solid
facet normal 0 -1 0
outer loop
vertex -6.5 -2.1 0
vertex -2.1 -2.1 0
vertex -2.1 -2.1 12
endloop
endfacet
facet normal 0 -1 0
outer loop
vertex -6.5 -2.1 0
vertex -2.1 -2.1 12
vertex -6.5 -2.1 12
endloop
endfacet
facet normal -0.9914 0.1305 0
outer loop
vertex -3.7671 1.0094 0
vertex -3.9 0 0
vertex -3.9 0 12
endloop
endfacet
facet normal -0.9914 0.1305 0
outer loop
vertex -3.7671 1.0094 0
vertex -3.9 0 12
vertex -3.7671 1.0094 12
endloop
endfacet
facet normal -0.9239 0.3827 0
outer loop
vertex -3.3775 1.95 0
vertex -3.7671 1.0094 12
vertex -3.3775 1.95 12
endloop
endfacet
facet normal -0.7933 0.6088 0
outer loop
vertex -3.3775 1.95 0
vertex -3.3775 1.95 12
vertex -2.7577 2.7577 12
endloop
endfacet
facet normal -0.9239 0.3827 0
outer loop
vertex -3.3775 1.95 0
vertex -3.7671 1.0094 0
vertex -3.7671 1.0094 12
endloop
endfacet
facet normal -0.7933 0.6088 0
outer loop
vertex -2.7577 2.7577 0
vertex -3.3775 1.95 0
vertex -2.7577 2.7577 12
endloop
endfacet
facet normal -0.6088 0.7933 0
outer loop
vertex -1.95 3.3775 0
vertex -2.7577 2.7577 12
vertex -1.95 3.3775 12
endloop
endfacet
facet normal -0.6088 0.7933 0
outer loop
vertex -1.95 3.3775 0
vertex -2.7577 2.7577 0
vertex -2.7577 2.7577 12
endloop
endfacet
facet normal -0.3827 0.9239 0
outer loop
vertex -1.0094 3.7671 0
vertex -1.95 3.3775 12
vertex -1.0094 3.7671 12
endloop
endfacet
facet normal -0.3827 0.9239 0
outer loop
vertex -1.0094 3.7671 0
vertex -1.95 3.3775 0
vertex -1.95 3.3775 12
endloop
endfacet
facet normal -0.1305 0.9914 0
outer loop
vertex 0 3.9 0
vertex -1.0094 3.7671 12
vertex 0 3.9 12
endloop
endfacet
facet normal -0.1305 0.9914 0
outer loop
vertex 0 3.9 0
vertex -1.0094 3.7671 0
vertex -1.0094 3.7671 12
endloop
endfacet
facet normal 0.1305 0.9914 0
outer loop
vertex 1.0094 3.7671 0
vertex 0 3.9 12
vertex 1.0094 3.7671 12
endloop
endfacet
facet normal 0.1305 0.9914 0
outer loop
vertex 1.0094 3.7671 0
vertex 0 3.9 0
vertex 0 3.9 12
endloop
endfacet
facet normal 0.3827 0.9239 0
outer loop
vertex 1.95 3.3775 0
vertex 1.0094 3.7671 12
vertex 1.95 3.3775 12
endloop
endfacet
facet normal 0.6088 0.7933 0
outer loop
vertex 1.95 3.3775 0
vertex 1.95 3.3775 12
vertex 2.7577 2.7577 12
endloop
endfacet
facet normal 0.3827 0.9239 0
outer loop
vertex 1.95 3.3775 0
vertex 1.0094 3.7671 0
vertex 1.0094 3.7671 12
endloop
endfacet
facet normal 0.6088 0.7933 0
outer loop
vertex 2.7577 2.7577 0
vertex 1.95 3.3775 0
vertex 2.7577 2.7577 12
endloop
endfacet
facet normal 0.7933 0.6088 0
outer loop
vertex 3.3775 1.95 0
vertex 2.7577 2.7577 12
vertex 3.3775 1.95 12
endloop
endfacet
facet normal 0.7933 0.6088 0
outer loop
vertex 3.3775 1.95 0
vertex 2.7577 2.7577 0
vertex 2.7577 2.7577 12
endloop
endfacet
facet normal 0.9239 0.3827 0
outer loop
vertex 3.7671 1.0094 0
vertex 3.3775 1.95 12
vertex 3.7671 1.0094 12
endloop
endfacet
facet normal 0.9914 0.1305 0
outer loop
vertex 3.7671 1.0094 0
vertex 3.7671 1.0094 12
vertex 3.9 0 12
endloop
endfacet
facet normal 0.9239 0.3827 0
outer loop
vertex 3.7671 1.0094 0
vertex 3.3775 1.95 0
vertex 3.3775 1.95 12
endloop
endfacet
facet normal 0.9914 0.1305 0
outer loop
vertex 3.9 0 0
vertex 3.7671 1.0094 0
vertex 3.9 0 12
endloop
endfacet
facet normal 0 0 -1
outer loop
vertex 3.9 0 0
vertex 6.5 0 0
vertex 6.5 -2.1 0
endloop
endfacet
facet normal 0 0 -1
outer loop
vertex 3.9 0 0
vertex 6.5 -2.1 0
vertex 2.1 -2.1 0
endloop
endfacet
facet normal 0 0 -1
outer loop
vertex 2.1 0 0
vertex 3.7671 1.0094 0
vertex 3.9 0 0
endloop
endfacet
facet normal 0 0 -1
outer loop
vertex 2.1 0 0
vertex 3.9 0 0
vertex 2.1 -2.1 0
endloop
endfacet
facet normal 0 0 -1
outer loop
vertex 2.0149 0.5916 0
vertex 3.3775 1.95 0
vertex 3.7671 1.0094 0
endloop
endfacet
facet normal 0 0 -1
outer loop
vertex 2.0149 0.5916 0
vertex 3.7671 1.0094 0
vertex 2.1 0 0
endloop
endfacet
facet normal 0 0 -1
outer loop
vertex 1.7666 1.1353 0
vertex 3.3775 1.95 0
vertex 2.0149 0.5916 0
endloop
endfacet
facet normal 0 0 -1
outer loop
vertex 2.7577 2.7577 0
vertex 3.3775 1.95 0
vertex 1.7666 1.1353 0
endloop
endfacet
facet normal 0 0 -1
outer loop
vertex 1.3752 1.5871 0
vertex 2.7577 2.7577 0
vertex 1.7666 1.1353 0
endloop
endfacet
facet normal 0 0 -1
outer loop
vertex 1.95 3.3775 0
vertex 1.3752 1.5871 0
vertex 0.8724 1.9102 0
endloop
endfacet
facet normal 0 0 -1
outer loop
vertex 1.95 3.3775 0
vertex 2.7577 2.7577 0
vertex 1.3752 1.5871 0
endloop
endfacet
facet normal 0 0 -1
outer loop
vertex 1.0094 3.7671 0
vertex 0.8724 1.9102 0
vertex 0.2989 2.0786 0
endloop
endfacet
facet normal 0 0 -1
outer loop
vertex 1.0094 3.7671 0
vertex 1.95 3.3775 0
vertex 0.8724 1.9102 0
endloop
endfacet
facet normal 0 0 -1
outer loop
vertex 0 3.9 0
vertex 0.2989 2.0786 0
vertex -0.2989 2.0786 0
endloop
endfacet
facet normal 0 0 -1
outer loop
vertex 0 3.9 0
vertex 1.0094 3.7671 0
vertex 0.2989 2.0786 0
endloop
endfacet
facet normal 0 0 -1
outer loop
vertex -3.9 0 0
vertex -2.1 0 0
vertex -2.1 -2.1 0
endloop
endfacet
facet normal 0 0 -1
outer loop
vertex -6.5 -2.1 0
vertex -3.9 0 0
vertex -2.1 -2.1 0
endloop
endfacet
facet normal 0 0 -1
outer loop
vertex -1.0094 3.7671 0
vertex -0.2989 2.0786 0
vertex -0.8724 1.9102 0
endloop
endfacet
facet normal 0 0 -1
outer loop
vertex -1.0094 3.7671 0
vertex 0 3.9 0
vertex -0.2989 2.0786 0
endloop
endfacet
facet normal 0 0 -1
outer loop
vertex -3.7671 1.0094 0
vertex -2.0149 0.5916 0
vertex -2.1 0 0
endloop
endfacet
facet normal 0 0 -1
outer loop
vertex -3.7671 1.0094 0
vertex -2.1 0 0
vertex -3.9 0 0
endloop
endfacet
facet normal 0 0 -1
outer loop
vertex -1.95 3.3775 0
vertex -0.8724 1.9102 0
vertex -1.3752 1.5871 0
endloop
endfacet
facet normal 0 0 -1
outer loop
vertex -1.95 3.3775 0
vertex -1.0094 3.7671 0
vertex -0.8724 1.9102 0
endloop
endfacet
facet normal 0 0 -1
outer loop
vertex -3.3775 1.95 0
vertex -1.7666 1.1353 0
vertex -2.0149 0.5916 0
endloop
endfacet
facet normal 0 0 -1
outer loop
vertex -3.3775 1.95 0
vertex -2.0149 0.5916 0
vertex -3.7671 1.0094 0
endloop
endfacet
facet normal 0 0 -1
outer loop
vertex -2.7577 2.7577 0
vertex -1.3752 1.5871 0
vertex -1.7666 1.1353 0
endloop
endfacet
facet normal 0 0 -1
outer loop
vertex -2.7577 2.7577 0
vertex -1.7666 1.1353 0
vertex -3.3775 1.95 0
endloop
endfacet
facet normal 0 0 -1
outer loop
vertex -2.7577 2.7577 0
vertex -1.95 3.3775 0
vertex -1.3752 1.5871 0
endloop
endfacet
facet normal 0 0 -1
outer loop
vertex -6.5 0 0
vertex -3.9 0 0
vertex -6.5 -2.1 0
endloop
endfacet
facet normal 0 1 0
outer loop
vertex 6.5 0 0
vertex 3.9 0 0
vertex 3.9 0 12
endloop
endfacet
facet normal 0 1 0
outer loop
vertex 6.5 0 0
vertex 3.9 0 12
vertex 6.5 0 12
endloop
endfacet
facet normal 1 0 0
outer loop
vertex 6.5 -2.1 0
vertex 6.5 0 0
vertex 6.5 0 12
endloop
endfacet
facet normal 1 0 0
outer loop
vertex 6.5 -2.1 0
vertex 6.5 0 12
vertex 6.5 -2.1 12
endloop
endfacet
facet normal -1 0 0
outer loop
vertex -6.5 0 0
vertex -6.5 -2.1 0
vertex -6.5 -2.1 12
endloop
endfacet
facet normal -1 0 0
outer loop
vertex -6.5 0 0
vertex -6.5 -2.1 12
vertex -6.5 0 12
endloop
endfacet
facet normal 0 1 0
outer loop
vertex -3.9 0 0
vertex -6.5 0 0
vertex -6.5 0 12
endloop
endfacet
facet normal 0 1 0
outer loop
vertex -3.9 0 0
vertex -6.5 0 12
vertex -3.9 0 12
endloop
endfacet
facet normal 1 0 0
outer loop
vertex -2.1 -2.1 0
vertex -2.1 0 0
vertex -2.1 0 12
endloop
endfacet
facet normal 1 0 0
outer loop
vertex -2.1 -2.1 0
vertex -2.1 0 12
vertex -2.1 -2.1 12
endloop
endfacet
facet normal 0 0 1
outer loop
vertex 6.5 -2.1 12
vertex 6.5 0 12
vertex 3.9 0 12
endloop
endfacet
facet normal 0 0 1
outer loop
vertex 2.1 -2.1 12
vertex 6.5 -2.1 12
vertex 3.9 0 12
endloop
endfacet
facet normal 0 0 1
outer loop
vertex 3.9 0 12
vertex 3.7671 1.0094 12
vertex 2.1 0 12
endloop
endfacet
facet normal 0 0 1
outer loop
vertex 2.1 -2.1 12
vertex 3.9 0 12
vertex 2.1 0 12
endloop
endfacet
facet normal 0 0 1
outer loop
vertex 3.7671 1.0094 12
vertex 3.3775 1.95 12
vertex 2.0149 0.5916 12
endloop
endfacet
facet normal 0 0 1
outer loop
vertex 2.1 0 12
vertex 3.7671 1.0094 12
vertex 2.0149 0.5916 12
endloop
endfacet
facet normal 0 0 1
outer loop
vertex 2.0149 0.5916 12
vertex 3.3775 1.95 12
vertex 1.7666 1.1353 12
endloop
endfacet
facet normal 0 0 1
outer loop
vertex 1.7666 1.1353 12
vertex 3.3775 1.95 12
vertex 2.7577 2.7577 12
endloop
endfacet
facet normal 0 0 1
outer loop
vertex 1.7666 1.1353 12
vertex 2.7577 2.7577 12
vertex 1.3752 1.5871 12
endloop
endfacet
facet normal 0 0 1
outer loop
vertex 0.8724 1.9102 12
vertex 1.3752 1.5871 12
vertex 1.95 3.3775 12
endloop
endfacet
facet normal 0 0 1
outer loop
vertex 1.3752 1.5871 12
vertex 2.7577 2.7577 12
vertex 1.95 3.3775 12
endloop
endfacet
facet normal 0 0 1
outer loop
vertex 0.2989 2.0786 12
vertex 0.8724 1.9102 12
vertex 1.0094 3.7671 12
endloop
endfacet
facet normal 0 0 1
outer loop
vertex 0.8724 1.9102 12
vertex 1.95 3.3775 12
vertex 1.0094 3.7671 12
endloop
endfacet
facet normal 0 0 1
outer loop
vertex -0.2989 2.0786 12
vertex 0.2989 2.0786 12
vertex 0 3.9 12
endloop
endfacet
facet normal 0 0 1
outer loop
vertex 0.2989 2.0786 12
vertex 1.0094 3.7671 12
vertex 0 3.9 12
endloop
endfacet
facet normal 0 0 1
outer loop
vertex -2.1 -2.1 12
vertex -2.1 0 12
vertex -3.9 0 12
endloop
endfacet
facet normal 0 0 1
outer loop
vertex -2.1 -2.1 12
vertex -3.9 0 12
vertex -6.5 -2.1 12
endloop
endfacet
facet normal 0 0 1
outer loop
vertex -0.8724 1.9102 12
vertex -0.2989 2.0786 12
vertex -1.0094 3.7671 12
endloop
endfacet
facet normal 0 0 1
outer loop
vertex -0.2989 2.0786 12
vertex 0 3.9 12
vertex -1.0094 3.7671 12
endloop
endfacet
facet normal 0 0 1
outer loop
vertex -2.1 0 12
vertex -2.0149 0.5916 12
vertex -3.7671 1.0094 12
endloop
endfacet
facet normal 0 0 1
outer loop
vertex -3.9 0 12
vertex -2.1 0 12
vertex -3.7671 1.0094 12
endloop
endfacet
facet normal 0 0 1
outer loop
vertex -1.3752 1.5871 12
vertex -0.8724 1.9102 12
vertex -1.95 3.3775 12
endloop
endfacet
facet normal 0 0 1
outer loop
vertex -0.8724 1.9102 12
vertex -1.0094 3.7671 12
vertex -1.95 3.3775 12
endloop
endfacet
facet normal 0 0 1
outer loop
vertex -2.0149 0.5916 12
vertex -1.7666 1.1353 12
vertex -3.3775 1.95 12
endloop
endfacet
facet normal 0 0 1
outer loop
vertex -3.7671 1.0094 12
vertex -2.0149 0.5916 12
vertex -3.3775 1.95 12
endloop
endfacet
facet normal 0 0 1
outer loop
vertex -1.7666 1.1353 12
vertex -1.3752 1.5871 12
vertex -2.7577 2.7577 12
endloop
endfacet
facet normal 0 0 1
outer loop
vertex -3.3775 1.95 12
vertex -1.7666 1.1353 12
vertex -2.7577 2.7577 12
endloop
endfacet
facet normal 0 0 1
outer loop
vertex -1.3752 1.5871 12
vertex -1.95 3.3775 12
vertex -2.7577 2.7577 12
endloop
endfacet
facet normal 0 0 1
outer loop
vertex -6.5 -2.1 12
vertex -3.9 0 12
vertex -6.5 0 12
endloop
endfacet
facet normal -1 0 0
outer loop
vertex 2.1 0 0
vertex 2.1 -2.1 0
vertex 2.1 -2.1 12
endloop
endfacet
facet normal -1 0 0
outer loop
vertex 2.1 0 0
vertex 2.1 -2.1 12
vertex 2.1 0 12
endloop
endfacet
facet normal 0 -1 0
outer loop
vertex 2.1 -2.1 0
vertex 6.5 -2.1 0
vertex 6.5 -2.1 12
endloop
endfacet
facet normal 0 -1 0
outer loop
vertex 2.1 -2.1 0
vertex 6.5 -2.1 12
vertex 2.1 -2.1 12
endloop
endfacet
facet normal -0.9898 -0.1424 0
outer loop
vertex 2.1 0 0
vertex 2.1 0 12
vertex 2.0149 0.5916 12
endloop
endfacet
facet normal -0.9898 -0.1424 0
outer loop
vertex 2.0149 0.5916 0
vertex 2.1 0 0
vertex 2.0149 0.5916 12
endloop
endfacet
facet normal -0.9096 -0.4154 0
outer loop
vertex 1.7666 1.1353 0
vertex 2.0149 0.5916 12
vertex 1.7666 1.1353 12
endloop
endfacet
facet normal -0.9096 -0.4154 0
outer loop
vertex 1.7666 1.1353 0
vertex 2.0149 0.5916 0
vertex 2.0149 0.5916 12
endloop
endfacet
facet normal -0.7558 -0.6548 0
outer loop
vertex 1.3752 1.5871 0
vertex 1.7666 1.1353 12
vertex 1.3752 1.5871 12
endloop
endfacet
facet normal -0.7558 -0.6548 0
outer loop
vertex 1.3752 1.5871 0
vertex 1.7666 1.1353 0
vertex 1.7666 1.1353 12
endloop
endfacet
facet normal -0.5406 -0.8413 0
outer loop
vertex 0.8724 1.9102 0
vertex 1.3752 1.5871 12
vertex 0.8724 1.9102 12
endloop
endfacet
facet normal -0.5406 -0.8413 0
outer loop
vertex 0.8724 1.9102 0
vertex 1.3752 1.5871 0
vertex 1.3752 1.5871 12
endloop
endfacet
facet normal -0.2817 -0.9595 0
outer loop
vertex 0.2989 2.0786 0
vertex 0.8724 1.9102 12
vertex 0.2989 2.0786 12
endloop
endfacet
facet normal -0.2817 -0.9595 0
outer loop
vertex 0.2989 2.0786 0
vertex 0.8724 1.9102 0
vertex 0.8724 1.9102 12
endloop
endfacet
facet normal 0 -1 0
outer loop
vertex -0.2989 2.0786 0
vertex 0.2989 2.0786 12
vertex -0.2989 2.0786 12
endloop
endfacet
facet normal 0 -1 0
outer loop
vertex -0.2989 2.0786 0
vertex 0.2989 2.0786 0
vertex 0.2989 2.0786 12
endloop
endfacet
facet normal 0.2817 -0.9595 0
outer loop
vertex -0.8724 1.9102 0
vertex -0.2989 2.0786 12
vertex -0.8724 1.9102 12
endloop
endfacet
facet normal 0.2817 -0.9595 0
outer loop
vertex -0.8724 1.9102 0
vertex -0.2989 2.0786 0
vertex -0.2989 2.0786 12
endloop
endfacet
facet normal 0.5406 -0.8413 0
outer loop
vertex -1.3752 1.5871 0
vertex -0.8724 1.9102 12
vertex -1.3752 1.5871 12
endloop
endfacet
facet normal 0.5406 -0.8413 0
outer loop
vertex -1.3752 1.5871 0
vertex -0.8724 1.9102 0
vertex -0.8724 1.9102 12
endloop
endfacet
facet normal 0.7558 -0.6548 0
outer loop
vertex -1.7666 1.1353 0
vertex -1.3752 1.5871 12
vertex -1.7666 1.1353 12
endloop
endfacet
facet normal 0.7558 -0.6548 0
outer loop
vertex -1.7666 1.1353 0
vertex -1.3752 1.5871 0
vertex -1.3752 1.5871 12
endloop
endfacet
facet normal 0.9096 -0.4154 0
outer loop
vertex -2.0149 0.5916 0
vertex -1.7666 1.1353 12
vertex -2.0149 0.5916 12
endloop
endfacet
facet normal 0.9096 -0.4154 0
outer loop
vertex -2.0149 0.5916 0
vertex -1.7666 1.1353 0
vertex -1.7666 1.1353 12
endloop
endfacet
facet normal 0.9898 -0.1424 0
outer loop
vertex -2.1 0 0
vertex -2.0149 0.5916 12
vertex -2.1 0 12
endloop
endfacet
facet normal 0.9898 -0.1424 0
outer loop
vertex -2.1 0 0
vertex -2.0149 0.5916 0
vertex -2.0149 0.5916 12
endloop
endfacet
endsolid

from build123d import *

# Parameters (mm, degrees)
BOSS_EXTRUDE1_DEPTH = 12


with BuildPart() as part:
    # Sketch1 → Boss-Extrude1 (new body)
    with BuildSketch(Plane.XY):
        with BuildLine():
            Line((-2.1, 0), (-2.1, -2.1))
            Line((-2.1, -2.1), (-6.5, -2.1))
            Line((-6.5, -2.1), (-6.5, 0))
            Line((-6.5, 0), (-3.9, 0))
            ThreePointArc((-3.9, 0), (0, 3.9), (3.9, 0))
            Line((3.9, 0), (6.5, 0))
            Line((6.5, 0), (6.5, -2.1))
            Line((6.5, -2.1), (2.1, -2.1))
            Line((2.1, -2.1), (2.1, 0))
            ThreePointArc((2.1, 0), (0, 2.1), (-2.1, 0))
        make_face()
    extrude(amount=BOSS_EXTRUDE1_DEPTH)


solid = part.part
